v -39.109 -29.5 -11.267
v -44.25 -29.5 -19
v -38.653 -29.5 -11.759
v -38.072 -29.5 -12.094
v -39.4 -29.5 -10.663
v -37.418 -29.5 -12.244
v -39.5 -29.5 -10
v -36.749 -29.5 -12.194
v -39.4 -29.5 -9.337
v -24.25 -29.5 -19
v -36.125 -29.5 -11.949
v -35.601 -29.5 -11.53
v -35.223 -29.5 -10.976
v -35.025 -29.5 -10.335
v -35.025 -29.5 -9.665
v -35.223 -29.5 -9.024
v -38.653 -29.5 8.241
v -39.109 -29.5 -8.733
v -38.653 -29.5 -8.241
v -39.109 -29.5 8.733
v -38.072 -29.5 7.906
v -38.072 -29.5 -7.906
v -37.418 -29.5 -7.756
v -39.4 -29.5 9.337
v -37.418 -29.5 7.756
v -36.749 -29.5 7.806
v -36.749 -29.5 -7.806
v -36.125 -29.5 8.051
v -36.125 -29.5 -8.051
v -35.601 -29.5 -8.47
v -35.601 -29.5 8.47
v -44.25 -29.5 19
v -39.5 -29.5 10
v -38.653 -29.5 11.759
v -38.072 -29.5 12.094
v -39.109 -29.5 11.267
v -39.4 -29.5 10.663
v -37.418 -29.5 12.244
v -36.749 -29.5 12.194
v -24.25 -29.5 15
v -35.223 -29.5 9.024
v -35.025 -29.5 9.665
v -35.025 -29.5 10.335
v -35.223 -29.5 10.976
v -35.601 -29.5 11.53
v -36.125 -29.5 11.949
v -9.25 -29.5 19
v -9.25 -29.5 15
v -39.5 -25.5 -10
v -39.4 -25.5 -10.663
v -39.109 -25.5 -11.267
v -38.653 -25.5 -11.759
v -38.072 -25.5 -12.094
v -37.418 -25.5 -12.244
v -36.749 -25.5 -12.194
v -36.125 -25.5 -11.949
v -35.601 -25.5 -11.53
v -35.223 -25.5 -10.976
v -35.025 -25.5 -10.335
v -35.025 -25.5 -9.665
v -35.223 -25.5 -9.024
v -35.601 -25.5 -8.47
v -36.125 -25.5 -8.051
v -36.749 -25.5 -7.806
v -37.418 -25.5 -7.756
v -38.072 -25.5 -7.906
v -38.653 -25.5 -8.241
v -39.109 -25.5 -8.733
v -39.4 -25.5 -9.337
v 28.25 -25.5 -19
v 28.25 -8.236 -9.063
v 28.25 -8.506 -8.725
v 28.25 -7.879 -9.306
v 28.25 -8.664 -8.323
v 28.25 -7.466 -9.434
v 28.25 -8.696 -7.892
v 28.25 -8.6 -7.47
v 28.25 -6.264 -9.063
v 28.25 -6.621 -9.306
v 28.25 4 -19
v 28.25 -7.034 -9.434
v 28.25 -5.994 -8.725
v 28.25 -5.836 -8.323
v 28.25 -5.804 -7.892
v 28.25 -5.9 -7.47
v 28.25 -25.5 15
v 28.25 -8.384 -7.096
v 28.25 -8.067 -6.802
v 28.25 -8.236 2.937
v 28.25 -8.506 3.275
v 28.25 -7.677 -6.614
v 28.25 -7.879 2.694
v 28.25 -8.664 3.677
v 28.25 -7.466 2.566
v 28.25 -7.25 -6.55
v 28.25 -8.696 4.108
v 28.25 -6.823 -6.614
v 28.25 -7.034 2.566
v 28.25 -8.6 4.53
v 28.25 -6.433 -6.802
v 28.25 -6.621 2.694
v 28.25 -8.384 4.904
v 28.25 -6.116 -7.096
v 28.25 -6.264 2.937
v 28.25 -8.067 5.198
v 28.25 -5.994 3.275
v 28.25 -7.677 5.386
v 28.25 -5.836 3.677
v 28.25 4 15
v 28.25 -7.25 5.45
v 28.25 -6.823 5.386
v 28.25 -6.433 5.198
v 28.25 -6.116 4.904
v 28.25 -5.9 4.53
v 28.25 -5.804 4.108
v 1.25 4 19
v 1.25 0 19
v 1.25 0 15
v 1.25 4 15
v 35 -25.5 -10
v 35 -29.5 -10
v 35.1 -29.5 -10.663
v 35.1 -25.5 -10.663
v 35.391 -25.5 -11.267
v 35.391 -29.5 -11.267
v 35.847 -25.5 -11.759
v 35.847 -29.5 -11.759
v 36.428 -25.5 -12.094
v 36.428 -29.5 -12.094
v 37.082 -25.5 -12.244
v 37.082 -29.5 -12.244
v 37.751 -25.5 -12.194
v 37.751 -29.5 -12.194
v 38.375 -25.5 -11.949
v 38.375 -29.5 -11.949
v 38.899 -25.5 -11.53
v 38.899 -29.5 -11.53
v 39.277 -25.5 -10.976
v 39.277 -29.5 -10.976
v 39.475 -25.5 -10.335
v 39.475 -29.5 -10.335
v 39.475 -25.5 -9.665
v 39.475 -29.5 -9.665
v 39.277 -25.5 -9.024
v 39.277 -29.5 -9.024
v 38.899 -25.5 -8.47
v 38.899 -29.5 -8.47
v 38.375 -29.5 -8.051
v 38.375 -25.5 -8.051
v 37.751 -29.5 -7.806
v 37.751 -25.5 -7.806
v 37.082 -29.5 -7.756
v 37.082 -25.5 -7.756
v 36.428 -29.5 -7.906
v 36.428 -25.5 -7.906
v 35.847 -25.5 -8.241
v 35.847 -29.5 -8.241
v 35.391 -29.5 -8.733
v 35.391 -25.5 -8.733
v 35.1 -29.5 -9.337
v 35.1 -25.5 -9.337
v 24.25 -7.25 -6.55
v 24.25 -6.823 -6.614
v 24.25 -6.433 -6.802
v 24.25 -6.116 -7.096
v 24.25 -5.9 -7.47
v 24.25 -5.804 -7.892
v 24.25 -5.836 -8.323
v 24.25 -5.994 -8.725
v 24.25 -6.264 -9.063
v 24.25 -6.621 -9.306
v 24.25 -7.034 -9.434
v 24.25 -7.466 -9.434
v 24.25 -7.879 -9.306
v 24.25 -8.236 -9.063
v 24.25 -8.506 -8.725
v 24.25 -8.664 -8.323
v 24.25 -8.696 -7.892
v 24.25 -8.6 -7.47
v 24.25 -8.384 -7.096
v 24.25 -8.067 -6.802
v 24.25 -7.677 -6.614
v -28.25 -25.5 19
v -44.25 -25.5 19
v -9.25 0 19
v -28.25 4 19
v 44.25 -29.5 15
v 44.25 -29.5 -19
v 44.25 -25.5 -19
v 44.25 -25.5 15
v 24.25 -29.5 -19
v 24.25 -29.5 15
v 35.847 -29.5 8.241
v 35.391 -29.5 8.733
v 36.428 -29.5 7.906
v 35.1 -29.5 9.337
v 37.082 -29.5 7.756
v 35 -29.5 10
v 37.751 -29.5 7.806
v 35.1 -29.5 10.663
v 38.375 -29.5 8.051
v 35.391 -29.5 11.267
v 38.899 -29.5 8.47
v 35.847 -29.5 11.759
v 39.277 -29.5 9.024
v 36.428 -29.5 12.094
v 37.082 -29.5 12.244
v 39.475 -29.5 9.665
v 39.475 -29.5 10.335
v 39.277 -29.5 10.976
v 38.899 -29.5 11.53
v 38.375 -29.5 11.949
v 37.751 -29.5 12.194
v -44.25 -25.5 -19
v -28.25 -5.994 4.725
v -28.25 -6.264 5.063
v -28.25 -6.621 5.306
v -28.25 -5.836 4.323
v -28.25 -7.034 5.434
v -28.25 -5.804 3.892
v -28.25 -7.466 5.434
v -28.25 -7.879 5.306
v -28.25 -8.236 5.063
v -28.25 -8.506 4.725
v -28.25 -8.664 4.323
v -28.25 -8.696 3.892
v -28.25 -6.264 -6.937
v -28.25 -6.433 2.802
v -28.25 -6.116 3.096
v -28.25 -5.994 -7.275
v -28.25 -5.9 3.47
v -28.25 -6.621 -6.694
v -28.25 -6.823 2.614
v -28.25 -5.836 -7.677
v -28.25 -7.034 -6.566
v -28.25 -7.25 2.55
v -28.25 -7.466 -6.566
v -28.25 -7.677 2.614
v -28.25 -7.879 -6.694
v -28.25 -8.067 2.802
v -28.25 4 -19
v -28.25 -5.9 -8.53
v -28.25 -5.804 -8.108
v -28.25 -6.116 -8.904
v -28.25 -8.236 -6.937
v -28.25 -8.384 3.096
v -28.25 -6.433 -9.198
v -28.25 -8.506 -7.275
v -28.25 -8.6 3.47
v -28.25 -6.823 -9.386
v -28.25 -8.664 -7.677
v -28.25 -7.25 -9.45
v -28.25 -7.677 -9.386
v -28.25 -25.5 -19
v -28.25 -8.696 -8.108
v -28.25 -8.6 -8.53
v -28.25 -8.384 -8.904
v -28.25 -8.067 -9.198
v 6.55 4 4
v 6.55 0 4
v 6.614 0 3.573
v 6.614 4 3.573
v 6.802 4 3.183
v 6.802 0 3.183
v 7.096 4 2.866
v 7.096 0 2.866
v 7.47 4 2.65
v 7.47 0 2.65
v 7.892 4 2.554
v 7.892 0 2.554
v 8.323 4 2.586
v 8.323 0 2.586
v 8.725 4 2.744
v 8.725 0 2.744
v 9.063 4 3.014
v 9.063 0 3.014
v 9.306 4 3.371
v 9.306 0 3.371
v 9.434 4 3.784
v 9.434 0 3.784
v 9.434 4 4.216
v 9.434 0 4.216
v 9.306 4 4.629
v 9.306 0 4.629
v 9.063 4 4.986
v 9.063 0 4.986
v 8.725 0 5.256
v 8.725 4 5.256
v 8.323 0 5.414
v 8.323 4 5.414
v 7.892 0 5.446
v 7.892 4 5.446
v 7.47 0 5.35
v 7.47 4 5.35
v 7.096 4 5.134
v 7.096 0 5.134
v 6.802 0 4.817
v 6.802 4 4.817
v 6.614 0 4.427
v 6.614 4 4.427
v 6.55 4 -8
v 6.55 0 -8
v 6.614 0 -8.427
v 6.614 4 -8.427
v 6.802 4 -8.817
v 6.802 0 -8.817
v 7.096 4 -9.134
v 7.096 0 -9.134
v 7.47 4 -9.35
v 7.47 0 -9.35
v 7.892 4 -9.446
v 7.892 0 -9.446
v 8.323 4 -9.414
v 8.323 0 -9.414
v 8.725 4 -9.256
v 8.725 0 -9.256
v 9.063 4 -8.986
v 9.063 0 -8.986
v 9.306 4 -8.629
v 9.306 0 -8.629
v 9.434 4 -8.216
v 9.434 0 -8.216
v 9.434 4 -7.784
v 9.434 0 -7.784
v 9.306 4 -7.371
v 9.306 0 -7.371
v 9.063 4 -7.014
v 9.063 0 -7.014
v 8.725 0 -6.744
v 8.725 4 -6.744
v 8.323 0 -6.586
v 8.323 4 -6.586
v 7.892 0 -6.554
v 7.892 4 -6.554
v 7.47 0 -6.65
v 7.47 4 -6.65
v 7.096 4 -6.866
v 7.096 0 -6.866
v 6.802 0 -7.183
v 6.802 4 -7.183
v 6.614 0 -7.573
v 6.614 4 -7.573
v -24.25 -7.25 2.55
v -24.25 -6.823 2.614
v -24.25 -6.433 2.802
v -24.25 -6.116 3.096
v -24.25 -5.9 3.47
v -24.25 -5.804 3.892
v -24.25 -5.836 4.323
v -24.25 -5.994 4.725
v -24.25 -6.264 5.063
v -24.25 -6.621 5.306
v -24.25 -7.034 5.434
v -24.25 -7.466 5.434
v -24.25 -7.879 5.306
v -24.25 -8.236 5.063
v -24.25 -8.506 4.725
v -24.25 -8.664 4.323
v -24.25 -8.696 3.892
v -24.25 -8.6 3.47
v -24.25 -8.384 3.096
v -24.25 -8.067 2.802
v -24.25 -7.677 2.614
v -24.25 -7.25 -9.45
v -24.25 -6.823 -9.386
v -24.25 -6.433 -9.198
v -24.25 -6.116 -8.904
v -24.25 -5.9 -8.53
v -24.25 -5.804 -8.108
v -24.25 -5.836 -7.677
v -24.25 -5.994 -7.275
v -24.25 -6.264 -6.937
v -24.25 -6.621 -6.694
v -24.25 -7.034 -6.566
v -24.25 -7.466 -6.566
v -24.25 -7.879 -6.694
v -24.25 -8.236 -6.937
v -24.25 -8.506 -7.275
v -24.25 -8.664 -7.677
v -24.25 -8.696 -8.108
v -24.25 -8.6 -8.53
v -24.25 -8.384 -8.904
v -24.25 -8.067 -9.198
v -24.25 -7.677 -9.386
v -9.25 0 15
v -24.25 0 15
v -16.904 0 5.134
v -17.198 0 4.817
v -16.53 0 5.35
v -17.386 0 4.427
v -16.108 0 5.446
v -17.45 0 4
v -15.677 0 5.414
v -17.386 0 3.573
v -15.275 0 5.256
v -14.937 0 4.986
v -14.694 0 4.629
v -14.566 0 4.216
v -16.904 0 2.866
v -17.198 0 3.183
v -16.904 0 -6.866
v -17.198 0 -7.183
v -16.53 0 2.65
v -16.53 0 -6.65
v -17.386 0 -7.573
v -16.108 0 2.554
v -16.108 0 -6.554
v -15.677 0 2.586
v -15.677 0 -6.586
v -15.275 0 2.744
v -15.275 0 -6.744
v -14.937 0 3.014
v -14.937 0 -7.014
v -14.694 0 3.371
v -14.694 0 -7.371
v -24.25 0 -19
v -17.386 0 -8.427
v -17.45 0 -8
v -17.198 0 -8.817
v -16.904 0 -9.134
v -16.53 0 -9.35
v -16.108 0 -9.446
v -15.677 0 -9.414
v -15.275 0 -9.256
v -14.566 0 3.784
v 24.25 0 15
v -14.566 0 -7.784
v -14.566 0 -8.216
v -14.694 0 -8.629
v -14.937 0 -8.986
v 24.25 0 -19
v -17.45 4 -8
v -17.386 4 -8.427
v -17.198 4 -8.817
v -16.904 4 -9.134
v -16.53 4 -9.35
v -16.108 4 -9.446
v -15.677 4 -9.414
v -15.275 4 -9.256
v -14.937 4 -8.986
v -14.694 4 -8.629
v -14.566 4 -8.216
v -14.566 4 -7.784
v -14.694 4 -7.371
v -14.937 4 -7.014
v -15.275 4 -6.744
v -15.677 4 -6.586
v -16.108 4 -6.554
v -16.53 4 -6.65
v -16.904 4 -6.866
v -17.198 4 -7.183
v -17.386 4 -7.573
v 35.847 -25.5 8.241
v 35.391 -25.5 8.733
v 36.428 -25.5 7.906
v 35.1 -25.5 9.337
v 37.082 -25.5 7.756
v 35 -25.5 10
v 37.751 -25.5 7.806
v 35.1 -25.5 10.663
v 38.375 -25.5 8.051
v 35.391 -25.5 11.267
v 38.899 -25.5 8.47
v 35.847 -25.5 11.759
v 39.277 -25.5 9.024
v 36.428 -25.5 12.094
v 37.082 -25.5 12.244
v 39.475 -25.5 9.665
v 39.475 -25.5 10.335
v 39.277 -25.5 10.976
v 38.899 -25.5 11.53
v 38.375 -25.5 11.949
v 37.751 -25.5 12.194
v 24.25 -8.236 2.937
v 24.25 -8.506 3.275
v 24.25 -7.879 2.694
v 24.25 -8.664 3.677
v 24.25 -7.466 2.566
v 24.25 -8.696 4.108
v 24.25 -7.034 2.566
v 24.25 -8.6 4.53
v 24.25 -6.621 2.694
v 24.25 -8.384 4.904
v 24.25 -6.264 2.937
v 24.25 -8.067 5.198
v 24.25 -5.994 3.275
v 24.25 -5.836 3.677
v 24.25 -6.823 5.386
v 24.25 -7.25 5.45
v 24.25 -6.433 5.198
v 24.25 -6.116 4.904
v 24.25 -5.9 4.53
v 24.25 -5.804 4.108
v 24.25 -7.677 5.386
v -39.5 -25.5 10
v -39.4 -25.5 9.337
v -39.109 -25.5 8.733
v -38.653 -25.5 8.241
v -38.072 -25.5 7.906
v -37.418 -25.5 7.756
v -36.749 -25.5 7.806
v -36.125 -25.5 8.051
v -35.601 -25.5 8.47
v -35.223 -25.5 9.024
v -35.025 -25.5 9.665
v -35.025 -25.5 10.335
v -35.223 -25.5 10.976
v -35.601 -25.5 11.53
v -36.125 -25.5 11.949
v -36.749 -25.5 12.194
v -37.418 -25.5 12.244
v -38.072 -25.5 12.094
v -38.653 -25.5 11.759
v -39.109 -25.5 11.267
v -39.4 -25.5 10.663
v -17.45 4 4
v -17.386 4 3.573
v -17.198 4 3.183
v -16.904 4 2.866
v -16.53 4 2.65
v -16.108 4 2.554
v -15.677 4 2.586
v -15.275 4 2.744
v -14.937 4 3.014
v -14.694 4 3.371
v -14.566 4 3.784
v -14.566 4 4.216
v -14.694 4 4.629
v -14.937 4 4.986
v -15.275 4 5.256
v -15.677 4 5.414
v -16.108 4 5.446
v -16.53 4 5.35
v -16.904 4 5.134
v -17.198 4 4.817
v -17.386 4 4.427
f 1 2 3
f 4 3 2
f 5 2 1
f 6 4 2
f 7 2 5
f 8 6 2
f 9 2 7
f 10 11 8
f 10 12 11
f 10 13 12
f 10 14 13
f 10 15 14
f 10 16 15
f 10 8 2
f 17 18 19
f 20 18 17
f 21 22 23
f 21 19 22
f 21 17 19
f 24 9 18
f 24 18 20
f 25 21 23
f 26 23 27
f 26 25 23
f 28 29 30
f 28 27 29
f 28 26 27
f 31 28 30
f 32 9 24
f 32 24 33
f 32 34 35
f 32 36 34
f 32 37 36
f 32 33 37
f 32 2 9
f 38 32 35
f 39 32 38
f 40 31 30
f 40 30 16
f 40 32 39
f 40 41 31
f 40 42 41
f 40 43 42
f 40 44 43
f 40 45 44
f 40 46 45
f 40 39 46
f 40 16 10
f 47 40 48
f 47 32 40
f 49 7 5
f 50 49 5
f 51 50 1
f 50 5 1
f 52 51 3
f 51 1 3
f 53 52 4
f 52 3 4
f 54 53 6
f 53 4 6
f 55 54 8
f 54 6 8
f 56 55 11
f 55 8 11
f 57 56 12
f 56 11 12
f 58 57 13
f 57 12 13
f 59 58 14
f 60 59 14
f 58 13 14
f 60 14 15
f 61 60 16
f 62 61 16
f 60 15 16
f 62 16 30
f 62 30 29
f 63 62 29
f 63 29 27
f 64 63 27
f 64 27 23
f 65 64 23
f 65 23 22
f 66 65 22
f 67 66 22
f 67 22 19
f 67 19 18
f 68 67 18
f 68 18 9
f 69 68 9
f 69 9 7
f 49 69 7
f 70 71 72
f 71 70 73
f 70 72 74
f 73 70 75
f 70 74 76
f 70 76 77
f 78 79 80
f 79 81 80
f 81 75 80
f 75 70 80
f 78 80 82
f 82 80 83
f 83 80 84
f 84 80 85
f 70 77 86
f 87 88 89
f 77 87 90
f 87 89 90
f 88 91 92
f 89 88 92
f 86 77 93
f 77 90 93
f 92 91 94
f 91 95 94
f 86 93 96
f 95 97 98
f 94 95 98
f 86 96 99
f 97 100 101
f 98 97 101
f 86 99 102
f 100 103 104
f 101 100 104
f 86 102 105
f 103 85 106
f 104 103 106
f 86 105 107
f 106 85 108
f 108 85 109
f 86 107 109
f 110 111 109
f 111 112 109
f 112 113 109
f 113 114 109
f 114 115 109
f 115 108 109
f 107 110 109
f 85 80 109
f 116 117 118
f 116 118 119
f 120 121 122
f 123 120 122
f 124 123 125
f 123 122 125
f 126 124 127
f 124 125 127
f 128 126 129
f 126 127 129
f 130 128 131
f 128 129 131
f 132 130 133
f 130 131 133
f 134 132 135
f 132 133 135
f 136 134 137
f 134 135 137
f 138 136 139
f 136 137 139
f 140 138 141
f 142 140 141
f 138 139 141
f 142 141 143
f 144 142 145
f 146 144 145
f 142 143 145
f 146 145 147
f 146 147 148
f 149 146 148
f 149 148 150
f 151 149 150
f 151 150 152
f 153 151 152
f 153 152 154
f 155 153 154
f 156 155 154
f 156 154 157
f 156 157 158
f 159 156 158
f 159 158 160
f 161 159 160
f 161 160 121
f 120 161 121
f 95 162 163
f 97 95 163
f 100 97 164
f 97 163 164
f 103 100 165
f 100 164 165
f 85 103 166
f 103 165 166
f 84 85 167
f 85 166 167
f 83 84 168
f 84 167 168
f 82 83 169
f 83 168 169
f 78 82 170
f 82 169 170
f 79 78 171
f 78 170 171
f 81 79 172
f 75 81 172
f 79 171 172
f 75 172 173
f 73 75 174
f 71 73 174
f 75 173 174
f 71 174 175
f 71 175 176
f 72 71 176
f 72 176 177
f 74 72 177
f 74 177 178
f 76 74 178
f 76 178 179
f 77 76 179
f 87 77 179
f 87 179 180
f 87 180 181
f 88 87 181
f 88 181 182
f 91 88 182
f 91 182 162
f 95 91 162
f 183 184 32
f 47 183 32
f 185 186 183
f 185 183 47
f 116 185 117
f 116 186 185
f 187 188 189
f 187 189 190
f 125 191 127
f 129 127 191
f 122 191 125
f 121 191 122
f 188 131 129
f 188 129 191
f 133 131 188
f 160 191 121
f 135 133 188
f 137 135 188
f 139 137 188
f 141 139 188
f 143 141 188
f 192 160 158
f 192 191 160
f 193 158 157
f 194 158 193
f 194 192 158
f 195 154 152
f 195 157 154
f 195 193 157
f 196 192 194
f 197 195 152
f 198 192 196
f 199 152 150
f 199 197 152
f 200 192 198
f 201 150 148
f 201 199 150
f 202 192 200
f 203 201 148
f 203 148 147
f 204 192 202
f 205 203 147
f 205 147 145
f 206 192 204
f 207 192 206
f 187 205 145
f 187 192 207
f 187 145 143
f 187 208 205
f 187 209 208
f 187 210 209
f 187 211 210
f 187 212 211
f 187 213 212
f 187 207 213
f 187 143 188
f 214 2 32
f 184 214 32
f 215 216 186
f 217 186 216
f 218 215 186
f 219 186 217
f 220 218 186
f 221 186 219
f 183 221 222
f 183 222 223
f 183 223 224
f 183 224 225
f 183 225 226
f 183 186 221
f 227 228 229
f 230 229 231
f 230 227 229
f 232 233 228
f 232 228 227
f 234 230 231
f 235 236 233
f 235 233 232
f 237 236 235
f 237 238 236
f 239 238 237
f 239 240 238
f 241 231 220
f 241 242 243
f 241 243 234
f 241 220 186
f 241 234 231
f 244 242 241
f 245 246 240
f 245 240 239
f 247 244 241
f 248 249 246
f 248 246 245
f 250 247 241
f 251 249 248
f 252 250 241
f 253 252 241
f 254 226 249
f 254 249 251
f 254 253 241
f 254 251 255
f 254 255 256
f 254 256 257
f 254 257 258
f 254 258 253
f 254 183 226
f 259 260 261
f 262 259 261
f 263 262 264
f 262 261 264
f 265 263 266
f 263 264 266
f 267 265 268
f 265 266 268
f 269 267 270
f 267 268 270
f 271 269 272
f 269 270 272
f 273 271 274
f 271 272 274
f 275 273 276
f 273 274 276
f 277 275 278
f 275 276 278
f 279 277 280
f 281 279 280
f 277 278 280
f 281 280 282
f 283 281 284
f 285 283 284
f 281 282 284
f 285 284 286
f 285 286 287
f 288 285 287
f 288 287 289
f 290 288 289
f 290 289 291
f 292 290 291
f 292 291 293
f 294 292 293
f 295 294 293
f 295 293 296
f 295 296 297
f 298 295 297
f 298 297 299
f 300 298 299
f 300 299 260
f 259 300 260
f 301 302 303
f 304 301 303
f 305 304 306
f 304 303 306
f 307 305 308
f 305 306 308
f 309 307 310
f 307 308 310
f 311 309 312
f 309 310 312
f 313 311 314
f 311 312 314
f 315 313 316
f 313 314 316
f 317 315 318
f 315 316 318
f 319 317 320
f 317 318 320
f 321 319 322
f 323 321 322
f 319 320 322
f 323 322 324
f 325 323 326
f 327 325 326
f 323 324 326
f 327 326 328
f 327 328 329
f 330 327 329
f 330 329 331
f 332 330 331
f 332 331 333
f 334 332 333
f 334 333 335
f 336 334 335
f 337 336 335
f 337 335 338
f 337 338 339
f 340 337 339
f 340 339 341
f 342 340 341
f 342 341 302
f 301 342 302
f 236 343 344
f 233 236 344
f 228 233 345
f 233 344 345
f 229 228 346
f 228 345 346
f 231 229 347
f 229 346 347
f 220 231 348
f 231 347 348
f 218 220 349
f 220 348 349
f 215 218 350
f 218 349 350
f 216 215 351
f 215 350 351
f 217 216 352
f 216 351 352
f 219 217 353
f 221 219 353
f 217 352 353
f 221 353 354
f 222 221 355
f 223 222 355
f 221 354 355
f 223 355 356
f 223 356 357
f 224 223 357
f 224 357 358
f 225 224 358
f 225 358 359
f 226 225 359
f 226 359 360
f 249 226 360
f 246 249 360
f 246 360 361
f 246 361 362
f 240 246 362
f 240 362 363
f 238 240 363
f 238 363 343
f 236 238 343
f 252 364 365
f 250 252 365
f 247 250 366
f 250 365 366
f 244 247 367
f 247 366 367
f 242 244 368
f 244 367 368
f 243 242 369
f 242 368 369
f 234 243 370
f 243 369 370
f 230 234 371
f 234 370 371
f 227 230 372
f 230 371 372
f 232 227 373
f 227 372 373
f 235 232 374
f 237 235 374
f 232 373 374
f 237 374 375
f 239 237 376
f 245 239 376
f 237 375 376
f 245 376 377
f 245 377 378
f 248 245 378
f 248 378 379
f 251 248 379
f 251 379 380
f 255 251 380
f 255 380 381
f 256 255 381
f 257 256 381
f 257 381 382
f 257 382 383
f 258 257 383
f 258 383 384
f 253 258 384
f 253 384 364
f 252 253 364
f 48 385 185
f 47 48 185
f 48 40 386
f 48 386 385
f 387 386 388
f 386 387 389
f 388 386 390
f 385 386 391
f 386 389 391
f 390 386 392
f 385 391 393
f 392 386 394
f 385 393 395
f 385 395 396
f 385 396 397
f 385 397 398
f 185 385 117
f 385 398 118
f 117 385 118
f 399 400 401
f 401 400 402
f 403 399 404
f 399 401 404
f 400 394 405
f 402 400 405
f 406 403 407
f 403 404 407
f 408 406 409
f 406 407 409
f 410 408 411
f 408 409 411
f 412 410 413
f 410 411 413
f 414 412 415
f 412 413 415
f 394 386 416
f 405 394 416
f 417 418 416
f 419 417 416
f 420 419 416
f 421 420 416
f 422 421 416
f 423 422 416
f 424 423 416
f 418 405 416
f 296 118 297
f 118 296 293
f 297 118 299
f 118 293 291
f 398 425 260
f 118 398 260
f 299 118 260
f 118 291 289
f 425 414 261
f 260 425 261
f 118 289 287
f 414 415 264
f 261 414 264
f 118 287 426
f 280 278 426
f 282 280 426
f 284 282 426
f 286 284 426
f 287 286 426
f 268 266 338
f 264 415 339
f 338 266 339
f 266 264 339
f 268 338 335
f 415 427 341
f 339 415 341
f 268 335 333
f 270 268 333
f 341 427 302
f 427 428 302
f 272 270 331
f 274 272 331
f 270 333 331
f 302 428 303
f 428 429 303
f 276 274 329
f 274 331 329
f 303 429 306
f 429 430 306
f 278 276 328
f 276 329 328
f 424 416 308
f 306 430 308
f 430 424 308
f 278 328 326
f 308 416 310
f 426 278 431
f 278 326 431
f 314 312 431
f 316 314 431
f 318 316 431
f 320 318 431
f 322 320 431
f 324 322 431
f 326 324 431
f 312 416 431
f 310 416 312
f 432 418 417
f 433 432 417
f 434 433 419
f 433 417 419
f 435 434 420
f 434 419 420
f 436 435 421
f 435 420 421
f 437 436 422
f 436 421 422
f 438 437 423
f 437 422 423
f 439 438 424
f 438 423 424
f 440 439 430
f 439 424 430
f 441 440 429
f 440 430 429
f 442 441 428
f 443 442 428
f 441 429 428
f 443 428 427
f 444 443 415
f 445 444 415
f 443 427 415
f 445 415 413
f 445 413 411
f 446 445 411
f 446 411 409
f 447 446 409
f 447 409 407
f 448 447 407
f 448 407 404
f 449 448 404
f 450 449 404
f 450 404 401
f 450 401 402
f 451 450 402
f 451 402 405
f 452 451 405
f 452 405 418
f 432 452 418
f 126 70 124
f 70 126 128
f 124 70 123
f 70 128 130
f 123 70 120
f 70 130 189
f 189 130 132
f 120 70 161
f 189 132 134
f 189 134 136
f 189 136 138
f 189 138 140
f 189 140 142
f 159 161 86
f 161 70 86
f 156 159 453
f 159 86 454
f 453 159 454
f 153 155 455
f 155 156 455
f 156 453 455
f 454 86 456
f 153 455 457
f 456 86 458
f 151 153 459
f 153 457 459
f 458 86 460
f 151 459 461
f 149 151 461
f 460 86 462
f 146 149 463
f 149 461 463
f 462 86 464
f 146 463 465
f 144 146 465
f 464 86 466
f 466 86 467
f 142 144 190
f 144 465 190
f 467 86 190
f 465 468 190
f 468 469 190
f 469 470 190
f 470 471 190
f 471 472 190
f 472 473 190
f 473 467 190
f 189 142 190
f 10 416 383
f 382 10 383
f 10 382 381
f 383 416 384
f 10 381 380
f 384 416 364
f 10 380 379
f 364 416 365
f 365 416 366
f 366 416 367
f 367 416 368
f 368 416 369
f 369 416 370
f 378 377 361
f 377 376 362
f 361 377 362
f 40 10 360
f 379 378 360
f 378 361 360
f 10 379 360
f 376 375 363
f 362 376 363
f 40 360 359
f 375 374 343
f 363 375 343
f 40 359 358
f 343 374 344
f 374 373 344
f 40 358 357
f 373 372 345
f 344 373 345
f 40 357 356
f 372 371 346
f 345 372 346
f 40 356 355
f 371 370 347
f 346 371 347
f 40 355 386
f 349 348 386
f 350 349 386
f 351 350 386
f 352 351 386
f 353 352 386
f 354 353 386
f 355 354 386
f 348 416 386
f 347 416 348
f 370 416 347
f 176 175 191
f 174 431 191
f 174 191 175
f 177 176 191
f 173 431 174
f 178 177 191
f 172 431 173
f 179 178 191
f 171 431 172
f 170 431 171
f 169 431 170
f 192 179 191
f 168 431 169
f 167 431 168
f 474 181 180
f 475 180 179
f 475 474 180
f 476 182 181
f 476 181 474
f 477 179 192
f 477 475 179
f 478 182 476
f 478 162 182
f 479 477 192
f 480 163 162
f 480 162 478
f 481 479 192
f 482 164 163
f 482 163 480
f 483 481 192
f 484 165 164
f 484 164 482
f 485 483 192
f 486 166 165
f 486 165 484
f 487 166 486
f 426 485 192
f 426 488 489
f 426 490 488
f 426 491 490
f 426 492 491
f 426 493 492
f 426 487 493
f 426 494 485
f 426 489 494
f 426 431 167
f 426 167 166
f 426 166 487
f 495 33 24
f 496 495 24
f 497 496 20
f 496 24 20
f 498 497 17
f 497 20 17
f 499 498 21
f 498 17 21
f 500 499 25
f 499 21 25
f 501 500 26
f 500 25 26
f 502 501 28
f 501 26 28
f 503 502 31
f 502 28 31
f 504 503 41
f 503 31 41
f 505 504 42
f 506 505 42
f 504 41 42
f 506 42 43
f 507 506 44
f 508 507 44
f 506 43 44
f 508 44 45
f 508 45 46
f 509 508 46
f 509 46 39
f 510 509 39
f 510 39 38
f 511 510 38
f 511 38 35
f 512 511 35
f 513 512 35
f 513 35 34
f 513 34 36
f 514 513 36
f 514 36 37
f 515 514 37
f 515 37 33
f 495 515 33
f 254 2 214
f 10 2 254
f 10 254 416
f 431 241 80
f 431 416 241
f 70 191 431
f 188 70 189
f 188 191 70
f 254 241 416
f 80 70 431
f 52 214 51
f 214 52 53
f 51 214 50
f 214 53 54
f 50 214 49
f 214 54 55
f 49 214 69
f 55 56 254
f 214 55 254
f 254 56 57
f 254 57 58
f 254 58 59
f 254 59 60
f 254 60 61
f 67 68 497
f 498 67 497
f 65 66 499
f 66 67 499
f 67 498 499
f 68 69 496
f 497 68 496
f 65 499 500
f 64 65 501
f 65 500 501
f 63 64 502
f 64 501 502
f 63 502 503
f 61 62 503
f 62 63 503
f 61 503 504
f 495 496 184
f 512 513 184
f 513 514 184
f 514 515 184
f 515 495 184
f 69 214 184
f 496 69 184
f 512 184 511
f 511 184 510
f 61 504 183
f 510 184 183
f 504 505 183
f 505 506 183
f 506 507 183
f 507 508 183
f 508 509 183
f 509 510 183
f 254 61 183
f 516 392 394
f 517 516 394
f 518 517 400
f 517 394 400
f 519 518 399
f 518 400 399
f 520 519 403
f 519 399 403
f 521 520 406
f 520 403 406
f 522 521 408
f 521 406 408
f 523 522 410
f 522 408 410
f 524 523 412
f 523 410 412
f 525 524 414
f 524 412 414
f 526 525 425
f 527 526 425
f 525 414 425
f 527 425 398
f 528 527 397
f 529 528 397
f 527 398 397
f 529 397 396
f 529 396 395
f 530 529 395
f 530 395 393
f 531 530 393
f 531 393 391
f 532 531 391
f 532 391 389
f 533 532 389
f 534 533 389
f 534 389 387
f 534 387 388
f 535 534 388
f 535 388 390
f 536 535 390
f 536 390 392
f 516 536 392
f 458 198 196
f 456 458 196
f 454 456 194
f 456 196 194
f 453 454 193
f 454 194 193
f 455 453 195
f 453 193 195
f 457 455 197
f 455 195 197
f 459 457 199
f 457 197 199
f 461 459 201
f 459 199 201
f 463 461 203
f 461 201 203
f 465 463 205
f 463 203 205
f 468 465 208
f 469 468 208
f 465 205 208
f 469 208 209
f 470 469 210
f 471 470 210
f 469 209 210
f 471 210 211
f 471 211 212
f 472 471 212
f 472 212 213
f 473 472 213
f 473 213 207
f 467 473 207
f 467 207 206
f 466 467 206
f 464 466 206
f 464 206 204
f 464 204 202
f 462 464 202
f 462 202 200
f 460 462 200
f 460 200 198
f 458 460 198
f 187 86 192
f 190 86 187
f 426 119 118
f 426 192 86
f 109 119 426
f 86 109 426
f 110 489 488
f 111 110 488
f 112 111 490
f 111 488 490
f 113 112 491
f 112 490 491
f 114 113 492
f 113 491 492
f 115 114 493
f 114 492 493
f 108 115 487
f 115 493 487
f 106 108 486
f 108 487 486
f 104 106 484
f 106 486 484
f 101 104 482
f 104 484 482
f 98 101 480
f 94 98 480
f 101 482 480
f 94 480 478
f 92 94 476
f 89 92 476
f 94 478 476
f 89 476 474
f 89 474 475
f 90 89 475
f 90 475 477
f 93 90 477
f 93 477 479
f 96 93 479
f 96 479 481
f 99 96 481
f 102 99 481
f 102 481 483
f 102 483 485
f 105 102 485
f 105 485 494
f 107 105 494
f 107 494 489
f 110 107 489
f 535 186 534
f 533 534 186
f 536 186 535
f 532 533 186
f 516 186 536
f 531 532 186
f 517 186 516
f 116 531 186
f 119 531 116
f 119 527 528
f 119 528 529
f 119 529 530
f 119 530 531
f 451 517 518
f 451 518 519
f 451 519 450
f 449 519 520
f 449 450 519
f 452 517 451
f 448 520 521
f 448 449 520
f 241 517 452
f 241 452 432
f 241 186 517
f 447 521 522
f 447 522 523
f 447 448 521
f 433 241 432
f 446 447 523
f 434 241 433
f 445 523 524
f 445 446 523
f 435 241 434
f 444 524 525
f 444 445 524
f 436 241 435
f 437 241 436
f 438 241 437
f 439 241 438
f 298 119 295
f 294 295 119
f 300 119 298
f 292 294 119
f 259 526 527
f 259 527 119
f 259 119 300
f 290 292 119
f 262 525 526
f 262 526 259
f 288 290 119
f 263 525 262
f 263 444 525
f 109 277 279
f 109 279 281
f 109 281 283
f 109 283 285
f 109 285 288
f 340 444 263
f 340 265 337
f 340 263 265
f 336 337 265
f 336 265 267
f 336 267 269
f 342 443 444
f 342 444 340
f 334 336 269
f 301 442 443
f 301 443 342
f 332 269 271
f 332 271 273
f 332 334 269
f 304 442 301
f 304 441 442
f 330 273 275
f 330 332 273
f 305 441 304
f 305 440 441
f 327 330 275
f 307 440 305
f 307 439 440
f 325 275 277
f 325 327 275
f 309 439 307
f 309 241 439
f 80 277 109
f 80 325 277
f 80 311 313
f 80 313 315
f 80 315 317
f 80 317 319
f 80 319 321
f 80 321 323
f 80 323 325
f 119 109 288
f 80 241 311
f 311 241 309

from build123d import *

# Parameters (mm, degrees)
SKETCH_31_W              = 56.5
SKETCH_31_H              = 38
EXTRUDE_11_DEPTH         = 4
SKETCH_32_W              = 4
SKETCH_32_H              = 38
EXTRUDE_12_DEPTH         = 29.5
SKETCH_33_W              = 16
SKETCH_33_H              = 38
EXTRUDE_13_DEPTH         = 4
SKETCH_34_W              = 15
SKETCH_34_H              = 4
EXTRUDE_14_DEPTH         = 29.5
HOLE_WIZARD_M2_5_1_D     = 2.9
HOLE_WIZARD_M2_5_1_DEPTH = 10
HOLE_WIZARD_M2_5_1_TIP   = 0.871247898
HOLE_WIZARD_M2_5_2_D     = 2.9
HOLE_WIZARD_M2_5_2_DEPTH = 10
HOLE_WIZARD_M2_5_2_TIP   = 0.871247898
HOLE_WIZARD_M2_5_3_D     = 2.9
HOLE_WIZARD_M2_5_3_DEPTH = 10
HOLE_WIZARD_M2_5_3_TIP   = 0.871247898
HOLE_WIZARD_M4_1_D       = 4.5
HOLE_WIZARD_M4_1_DEPTH   = 10
HOLE_WIZARD_M4_1_TIP     = 1.351936393
SKETCH_46_W              = 43
SKETCH_46_H              = 33.5
CUT_EXTRUDE_4_DEPTH      = 4


with BuildPart() as part:
    # 스케치31 → 보스-돌출11 (new body)
    with BuildSketch(Plane(origin=(0, 0, 0), x_dir=(1, 0, 0), z_dir=(0, 1, 0))):
        Rectangle(SKETCH_31_W, SKETCH_31_H)
    extrude(amount=EXTRUDE_11_DEPTH)

    # 스케치32 → 보스-돌출12 (add)
    with BuildSketch(Plane.XZ):
        with Locations((26.25, 0)):
            Rectangle(SKETCH_32_W, SKETCH_32_H)
        with Locations((-26.25, 0)):
            Rectangle(SKETCH_32_W, SKETCH_32_H)
    extrude(amount=EXTRUDE_12_DEPTH)

    # 스케치33 → 보스-돌출13 (add)
    with BuildSketch(Plane.XZ.offset(29.5)):
        with Locations((-36.25, 0)):
            Rectangle(SKETCH_33_W, SKETCH_33_H)
        with Locations((36.25, 0)):
            Rectangle(SKETCH_33_W, SKETCH_33_H)
    extrude(amount=-EXTRUDE_13_DEPTH)

    # 스케치34 → 보스-돌출14 (add)
    with BuildSketch(Plane.XZ):
        with Locations((-16.75, 17)):
            Rectangle(SKETCH_34_W, SKETCH_34_H)
    extrude(amount=EXTRUDE_14_DEPTH)

    # M2.5 여유 구멍1
    with Locations(Plane(origin=(0, 4, 0), x_dir=(1, 0, 0), z_dir=(0, 1, 0))):
        with Locations((8, 8), (8, -4), (-16, -4), (-16, 8)):
            Hole(HOLE_WIZARD_M2_5_1_D / 2, depth=HOLE_WIZARD_M2_5_1_DEPTH)
            with Locations((0, 0, -(HOLE_WIZARD_M2_5_1_DEPTH + HOLE_WIZARD_M2_5_1_TIP / 2))):  # 118° drill point
                Cone(0, HOLE_WIZARD_M2_5_1_D / 2, HOLE_WIZARD_M2_5_1_TIP, mode=Mode.SUBTRACT)

    # M2.5 여유 구멍2
    with Locations(Plane(origin=(28.25, 0, 0), x_dir=(0, 0, -1), z_dir=(1, 0, 0))):
        with Locations((-4, -7.25), (8, -7.25)):
            Hole(HOLE_WIZARD_M2_5_2_D / 2, depth=HOLE_WIZARD_M2_5_2_DEPTH)
            with Locations((0, 0, -(HOLE_WIZARD_M2_5_2_DEPTH + HOLE_WIZARD_M2_5_2_TIP / 2))):  # 118° drill point
                Cone(0, HOLE_WIZARD_M2_5_2_D / 2, HOLE_WIZARD_M2_5_2_TIP, mode=Mode.SUBTRACT)

    # M2.5 여유 구멍3
    with Locations(Plane.ZY.offset(28.25)):
        with Locations((4, -7.25), (-8, -7.25)):
            Hole(HOLE_WIZARD_M2_5_3_D / 2, depth=HOLE_WIZARD_M2_5_3_DEPTH)
            with Locations((0, 0, -(HOLE_WIZARD_M2_5_3_DEPTH + HOLE_WIZARD_M2_5_3_TIP / 2))):  # 118° drill point
                Cone(0, HOLE_WIZARD_M2_5_3_D / 2, HOLE_WIZARD_M2_5_3_TIP, mode=Mode.SUBTRACT)

    # M4 여유 구멍1
    with Locations(Plane(origin=(0, -25.5, 0), x_dir=(1, 0, 0), z_dir=(0, 1, 0))):
        with Locations((37.25, 10), (37.25, -10), (-37.25, -10), (-37.25, 10)):
            Hole(HOLE_WIZARD_M4_1_D / 2, depth=HOLE_WIZARD_M4_1_DEPTH)
            with Locations((0, 0, -(HOLE_WIZARD_M4_1_DEPTH + HOLE_WIZARD_M4_1_TIP / 2))):  # 118° drill point
                Cone(0, HOLE_WIZARD_M4_1_D / 2, HOLE_WIZARD_M4_1_TIP, mode=Mode.SUBTRACT)

    # 스케치46 → 컷-돌출4 (cut)
    with BuildSketch(Plane.XY.offset(19)):
        with Locations((22.75, -12.75)):
            Rectangle(SKETCH_46_W, SKETCH_46_H)
    extrude(amount=-CUT_EXTRUDE_4_DEPTH, mode=Mode.SUBTRACT)


solid = part.part
